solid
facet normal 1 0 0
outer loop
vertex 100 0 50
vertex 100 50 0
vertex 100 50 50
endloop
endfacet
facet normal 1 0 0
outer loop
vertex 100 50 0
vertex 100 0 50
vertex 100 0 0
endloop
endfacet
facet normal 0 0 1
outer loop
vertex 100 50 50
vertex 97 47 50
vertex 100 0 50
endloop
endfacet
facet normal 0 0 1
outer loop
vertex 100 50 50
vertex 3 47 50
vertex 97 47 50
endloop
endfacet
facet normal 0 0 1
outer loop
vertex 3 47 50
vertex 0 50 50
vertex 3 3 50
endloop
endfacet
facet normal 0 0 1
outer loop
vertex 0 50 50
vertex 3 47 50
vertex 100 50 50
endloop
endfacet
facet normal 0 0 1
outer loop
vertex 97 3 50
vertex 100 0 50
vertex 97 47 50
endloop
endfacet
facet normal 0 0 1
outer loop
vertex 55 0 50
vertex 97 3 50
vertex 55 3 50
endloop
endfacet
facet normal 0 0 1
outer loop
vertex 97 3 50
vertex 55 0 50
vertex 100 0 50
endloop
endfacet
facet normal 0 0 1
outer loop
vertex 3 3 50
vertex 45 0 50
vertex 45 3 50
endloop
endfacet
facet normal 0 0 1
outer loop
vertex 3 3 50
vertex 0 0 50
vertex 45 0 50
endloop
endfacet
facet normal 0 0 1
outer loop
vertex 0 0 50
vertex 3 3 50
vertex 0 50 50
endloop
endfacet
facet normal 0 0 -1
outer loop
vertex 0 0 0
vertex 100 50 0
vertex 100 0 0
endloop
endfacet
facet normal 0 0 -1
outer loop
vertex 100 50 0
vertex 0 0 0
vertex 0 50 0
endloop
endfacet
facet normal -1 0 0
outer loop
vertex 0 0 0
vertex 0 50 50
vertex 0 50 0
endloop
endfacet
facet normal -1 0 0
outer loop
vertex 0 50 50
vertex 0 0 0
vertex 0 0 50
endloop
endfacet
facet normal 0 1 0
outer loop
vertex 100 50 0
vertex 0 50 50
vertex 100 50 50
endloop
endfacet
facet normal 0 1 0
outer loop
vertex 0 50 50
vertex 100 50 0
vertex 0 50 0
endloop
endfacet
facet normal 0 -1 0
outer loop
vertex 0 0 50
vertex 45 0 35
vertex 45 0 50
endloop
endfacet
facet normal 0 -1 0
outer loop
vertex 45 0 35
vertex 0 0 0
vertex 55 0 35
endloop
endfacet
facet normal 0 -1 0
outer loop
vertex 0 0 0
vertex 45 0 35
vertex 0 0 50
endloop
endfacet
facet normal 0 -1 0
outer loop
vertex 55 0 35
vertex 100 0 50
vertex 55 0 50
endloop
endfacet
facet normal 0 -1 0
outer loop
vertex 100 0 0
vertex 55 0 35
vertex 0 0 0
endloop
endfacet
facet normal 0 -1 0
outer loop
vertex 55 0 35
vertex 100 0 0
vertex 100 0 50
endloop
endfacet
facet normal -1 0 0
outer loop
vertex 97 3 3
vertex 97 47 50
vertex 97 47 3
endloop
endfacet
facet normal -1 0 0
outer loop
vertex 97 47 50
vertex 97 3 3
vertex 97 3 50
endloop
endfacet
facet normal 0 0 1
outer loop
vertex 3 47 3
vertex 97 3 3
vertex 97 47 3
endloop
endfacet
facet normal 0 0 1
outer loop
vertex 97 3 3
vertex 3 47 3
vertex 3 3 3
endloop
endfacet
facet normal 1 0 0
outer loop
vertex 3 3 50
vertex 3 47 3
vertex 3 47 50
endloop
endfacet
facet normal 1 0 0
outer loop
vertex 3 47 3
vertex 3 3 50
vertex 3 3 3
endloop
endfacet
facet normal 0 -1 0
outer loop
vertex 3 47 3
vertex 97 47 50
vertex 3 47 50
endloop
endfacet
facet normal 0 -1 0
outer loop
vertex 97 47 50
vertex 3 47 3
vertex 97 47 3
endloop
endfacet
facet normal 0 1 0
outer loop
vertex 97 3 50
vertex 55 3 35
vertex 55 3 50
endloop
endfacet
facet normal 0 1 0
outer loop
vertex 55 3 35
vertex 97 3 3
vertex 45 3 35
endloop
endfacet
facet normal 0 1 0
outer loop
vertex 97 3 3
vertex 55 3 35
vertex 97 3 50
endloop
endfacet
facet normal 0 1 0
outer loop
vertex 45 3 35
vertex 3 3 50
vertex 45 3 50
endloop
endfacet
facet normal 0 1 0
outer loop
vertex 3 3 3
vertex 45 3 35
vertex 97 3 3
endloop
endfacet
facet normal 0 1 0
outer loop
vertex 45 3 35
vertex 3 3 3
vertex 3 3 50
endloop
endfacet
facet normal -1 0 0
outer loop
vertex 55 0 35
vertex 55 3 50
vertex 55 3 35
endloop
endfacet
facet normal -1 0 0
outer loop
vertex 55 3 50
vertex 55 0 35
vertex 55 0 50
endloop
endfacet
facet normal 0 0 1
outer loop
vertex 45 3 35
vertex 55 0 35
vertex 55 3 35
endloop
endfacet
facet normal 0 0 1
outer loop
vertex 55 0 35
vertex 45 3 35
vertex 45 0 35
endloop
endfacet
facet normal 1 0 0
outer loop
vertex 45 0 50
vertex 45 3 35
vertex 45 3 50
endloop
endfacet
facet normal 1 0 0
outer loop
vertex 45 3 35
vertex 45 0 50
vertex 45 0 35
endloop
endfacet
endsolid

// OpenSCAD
$fn = 32;

// ----------------------------------------------------------------------
// Enclosure box: notch enclosure
// ----------------------------------------------------------------------

// --- parameters (mm) ---
box_l = 100;              // outer length, X
box_w = 50;               // outer width, Y
box_h = 50;               // outer height
wall_t = 3;               // wall thickness
notch_w = 10;             // cable notch width
notch_h = 15;             // cable notch height

inner_h = box_h - wall_t;  // cavity depth
boss_h = inner_h - 2;  // corner boss height

difference() {
  cube([box_l, box_w, box_h]);
  translate([wall_t, wall_t, wall_t])
    cube([box_l - 2 * wall_t, box_w - 2 * wall_t, box_h]);
  translate([box_l / 2 - notch_w / 2, -1, box_h - notch_h])
    cube([notch_w, wall_t + 2, notch_h + 1]);
}
